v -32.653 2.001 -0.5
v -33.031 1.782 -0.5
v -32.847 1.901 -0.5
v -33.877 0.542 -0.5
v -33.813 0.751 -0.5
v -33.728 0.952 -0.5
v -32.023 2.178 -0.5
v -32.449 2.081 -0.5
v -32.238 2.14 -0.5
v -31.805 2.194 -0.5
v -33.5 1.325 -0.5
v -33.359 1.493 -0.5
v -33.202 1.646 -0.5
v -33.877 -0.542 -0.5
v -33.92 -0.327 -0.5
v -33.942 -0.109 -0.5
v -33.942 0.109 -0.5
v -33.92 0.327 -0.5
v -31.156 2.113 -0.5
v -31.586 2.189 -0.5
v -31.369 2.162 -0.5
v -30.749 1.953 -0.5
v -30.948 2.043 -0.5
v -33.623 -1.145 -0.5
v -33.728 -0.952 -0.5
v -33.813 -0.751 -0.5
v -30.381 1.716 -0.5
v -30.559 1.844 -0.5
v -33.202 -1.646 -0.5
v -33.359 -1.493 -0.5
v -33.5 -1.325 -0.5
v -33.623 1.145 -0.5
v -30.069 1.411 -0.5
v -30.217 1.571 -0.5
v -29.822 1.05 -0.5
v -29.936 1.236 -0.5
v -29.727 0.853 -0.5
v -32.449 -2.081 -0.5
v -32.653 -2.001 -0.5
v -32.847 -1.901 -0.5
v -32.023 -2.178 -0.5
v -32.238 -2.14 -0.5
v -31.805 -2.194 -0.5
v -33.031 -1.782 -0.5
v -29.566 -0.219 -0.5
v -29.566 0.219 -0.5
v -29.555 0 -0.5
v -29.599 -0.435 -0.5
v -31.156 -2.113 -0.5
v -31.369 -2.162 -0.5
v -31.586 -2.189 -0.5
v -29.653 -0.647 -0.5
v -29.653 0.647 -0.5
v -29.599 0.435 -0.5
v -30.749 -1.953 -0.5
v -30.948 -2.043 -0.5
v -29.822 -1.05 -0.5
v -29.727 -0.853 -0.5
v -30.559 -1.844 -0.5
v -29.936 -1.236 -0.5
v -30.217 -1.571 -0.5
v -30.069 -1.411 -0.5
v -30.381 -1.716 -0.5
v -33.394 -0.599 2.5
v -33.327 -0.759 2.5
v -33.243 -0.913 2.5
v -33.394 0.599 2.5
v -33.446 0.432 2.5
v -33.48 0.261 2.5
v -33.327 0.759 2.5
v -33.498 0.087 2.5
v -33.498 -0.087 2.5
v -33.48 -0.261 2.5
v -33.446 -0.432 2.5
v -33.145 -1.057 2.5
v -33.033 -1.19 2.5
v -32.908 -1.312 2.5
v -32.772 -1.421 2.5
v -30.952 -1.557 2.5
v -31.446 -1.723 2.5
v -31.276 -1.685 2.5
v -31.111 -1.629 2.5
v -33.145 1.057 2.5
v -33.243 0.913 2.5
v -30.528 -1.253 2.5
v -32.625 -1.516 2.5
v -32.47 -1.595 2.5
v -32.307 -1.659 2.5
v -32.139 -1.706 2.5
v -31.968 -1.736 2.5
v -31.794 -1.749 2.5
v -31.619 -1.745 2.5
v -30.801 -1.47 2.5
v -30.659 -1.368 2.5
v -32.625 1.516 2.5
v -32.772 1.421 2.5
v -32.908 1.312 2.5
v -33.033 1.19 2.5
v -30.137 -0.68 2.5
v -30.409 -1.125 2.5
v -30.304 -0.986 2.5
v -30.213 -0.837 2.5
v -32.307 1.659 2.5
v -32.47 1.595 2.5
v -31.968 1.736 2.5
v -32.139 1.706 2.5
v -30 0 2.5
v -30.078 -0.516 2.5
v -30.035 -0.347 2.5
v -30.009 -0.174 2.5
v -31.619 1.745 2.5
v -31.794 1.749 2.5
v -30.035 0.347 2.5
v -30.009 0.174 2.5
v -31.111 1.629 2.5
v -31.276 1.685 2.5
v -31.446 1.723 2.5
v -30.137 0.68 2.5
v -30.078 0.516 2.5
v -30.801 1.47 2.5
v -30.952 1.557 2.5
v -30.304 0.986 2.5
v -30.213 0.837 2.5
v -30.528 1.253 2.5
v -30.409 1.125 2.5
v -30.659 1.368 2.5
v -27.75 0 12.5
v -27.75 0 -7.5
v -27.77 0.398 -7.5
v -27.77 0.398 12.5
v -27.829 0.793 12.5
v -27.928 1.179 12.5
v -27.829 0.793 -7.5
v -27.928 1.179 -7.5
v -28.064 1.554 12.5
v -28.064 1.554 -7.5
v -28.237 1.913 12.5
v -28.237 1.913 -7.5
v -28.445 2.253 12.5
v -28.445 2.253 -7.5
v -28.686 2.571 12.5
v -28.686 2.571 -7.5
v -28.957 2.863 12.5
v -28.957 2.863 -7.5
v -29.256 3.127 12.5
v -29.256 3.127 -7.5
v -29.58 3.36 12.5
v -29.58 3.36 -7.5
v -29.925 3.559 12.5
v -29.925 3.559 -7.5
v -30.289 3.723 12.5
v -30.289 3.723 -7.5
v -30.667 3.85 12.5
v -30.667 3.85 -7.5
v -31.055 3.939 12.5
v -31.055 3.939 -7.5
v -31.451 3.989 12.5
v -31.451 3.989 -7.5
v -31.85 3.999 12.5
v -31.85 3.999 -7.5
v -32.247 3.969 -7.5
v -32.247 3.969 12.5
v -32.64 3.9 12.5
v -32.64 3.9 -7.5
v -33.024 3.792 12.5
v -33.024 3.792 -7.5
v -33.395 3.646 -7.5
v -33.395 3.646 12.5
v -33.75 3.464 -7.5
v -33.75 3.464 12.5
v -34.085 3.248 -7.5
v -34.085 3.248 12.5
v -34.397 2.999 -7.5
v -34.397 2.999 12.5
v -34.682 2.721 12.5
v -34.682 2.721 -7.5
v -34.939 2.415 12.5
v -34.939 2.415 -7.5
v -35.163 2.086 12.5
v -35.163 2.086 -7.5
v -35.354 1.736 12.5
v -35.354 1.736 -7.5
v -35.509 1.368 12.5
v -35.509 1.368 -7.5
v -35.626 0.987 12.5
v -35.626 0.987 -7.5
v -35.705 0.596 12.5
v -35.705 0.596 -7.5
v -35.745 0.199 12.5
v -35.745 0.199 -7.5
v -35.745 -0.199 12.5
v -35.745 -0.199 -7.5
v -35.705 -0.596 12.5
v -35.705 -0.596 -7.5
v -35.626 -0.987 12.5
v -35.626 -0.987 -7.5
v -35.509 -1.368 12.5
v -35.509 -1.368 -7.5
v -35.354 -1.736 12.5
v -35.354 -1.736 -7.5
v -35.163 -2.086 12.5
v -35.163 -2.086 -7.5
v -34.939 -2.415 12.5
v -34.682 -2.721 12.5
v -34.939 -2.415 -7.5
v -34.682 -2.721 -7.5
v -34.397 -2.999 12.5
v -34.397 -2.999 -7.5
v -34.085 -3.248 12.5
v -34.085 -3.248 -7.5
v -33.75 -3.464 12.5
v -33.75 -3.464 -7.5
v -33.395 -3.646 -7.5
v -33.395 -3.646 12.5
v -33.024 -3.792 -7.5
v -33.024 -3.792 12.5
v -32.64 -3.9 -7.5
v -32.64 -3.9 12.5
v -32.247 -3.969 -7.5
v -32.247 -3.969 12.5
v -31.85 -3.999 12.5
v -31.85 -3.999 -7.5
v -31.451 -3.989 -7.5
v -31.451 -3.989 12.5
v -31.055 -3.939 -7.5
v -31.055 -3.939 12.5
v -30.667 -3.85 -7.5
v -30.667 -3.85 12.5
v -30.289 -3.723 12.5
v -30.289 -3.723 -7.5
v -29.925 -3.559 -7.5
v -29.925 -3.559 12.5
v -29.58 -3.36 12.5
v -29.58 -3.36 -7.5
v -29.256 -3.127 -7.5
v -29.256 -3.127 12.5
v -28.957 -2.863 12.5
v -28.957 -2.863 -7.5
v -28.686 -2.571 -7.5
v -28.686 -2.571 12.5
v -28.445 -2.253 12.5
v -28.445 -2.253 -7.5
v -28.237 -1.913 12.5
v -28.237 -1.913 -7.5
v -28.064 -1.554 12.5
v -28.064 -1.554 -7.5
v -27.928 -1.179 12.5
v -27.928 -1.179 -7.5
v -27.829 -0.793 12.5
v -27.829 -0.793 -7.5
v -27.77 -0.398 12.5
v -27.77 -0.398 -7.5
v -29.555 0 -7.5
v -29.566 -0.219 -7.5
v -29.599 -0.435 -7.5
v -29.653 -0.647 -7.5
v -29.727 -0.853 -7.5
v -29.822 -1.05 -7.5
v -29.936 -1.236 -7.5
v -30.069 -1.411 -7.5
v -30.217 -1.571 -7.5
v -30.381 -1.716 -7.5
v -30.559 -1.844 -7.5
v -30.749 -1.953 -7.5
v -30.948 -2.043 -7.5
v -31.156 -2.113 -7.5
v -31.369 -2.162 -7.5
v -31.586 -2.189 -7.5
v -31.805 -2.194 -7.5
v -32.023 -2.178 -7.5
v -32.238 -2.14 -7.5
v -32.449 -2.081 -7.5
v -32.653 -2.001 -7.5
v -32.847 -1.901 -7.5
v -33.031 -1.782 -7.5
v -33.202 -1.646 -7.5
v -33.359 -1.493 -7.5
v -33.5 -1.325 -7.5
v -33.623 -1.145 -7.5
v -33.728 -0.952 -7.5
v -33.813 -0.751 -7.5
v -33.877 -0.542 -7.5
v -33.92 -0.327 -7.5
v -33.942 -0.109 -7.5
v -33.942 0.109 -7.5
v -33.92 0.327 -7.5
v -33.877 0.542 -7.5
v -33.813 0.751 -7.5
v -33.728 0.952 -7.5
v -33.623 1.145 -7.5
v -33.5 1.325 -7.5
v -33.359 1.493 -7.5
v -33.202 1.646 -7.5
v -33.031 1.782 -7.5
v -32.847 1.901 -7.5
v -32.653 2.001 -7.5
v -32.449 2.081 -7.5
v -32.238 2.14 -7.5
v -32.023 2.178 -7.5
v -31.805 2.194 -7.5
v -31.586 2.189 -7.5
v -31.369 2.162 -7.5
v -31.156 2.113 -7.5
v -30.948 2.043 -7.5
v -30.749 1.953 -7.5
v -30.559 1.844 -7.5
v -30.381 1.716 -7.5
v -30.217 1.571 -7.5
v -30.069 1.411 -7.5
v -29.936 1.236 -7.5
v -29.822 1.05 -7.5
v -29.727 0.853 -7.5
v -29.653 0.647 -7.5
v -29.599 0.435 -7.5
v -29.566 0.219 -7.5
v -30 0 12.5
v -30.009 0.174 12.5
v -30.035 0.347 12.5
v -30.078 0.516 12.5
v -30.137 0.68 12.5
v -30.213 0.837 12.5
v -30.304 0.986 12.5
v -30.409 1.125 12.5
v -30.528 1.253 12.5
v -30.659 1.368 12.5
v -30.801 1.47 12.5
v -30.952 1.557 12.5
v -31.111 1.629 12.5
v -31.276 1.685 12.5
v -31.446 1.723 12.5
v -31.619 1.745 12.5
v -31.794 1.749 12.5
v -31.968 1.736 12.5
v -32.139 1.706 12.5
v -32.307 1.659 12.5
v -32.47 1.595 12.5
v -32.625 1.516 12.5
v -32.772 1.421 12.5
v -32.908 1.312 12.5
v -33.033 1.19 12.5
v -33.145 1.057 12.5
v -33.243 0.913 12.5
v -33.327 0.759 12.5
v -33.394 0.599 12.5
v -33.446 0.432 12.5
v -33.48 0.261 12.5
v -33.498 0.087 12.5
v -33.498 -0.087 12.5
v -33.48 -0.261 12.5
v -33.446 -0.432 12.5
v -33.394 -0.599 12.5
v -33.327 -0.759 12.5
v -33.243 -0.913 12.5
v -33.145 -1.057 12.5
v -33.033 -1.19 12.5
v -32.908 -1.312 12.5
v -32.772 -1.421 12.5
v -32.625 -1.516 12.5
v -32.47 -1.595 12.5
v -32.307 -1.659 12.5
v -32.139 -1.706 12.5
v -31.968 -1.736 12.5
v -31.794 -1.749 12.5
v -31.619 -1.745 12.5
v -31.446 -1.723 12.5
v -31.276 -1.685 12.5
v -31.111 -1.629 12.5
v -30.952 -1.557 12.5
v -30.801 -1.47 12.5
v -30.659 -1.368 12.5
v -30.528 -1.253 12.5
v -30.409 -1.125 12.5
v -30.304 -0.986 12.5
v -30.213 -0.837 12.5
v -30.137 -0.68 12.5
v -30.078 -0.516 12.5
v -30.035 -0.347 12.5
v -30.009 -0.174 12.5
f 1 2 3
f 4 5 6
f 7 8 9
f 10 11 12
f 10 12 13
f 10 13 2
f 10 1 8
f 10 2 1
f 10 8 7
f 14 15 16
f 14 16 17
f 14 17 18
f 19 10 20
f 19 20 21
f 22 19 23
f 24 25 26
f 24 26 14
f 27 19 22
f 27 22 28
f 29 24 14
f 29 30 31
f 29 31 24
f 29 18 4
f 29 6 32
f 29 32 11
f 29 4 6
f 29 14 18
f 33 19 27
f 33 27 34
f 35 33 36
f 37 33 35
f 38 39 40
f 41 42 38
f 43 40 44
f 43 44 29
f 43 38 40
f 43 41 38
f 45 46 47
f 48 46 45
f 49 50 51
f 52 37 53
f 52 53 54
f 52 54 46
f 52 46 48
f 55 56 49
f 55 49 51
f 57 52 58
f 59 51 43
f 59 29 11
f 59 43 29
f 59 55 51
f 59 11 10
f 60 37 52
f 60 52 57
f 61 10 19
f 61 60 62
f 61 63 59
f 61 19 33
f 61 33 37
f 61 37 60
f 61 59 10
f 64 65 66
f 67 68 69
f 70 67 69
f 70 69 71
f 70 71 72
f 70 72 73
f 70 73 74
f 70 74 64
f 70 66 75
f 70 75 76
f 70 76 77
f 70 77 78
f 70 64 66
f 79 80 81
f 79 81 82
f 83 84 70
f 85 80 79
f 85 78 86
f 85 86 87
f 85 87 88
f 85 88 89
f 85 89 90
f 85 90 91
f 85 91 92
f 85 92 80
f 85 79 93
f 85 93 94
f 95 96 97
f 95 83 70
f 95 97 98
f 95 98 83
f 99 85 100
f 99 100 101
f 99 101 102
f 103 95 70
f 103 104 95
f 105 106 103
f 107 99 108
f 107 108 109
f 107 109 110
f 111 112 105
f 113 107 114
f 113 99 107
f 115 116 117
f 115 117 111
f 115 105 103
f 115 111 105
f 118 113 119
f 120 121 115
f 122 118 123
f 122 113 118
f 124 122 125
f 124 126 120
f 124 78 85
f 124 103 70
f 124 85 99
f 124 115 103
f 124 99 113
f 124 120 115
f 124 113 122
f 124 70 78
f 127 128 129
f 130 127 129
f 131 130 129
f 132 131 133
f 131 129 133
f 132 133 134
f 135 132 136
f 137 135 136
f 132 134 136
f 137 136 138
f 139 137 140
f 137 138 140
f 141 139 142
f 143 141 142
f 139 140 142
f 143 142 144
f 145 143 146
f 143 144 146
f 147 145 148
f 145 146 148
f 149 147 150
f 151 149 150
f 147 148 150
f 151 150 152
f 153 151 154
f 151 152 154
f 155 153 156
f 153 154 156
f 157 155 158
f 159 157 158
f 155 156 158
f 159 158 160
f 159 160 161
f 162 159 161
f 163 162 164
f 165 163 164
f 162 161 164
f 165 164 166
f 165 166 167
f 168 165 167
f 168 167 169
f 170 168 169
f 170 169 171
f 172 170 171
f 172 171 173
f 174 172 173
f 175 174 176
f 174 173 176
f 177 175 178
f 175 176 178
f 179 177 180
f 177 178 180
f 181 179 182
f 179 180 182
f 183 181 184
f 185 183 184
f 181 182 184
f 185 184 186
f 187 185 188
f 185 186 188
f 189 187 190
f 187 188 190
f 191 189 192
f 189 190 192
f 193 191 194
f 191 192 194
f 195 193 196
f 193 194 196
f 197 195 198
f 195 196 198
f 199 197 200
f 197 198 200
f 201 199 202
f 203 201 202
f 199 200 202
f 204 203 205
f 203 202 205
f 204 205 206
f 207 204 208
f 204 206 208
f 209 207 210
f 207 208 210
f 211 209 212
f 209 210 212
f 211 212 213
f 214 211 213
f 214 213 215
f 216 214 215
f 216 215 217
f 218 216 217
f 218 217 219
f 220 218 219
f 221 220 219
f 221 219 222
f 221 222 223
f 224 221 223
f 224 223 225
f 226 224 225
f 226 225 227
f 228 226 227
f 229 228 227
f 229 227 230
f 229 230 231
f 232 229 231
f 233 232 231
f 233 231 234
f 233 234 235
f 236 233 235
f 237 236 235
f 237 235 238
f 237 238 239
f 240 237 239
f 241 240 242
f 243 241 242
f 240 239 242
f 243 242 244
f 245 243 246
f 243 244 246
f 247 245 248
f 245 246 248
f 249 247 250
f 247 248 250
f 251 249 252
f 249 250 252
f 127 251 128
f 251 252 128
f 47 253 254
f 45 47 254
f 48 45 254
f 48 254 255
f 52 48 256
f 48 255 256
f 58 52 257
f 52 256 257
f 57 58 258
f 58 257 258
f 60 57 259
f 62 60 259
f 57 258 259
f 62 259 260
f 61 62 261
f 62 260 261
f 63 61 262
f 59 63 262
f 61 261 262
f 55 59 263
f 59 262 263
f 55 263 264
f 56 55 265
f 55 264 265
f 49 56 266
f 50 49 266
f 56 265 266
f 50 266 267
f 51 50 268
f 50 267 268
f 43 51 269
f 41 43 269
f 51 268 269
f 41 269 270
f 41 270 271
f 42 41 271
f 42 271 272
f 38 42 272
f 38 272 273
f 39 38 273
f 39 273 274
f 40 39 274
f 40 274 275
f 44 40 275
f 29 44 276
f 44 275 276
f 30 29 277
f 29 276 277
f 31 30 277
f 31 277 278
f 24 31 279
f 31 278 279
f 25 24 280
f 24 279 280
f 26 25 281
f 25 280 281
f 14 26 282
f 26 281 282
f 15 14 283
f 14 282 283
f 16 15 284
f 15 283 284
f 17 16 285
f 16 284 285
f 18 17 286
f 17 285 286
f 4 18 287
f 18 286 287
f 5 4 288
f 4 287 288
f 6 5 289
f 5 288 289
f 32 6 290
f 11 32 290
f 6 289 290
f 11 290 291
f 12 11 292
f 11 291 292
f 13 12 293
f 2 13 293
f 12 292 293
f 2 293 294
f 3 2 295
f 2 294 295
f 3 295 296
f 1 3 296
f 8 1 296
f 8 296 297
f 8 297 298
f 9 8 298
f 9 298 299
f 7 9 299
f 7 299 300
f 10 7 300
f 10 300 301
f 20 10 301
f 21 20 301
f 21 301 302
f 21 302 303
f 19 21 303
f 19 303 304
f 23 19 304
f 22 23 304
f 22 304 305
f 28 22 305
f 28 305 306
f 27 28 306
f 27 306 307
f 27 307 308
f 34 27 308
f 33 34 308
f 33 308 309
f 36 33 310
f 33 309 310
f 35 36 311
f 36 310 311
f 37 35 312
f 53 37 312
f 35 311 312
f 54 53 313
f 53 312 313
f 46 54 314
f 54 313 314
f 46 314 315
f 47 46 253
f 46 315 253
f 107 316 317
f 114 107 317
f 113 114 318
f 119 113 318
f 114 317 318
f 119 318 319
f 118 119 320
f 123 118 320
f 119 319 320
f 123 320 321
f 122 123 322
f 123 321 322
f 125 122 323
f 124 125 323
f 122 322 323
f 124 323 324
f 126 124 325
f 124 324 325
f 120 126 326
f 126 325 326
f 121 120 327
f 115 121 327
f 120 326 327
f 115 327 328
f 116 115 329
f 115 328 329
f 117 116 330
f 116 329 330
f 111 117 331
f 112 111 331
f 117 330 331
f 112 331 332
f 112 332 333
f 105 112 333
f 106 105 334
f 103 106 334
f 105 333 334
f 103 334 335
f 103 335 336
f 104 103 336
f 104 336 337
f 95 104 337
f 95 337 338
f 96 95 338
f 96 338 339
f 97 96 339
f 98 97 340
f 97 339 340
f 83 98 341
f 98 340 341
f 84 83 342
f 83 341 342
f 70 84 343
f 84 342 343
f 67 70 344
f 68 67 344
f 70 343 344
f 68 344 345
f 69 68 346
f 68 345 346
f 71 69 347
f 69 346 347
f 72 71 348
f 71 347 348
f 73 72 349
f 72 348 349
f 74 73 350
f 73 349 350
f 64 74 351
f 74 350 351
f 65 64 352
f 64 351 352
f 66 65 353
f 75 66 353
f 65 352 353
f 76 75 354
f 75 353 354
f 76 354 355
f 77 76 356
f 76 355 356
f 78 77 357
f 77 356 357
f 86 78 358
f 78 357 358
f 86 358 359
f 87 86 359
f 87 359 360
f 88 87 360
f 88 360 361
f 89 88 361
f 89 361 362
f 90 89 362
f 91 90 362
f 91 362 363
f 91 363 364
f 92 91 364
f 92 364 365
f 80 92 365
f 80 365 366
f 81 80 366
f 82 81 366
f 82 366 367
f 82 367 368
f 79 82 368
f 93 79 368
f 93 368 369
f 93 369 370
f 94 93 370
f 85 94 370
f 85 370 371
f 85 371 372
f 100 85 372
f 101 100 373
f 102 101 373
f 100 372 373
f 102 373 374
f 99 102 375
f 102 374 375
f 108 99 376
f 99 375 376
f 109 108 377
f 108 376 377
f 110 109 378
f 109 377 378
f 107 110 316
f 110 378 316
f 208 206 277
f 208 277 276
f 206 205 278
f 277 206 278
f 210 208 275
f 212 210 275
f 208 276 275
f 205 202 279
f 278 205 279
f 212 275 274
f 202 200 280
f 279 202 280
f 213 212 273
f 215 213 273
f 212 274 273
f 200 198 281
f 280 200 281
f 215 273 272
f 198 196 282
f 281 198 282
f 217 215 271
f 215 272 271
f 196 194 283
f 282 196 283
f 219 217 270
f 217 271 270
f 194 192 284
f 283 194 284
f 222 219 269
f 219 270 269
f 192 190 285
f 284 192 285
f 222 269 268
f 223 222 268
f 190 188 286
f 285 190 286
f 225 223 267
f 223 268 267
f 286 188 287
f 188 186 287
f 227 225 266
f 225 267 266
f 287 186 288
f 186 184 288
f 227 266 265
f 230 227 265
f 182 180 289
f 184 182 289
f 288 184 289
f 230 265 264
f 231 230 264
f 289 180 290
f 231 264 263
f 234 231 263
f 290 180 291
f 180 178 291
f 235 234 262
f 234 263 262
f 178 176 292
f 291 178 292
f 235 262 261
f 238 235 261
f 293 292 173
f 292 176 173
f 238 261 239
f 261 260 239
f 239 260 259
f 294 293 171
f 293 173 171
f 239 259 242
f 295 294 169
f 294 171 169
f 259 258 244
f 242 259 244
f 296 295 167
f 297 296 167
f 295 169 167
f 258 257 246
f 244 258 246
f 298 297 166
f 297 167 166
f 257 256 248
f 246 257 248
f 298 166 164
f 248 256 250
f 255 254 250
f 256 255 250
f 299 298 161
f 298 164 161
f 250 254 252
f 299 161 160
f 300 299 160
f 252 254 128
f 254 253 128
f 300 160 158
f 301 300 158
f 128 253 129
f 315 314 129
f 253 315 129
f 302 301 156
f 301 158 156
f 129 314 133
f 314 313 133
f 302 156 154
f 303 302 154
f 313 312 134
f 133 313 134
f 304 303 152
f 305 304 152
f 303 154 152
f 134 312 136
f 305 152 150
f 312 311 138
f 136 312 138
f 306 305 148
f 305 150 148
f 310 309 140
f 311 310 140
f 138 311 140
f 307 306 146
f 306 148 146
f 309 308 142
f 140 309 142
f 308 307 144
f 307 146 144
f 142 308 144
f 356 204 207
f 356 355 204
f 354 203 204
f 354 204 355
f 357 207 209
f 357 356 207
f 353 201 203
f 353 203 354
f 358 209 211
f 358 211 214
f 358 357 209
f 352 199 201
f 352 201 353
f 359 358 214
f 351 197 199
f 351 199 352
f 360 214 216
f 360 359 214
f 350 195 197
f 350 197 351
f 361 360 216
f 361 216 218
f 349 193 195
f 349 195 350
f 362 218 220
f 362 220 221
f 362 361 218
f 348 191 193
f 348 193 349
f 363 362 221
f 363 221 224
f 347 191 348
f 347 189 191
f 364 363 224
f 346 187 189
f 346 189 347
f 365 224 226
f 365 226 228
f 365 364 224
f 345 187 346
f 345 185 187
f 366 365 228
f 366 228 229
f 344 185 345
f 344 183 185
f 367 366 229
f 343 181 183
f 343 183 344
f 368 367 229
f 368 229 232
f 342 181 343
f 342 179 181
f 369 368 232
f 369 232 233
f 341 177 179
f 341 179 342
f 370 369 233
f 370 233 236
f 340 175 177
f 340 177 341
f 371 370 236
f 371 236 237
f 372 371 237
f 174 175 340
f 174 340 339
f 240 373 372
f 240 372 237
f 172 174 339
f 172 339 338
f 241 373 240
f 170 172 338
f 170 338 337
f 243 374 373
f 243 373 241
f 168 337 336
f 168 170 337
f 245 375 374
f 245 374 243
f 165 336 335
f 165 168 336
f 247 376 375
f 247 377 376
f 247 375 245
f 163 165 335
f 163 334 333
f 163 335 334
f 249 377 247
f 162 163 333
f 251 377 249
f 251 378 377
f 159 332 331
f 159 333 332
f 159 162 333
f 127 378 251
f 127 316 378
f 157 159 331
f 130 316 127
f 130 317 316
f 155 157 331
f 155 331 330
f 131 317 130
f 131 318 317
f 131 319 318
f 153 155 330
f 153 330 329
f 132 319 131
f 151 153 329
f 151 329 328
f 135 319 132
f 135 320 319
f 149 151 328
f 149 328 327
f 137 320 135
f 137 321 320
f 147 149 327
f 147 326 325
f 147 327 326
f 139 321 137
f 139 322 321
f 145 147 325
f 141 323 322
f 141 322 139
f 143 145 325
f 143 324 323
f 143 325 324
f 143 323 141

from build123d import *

# Parameters (mm, degrees)
SKETCH022_R     = 4
PAD009_DEPTH    = 20
SKETCH023_R     = 2.19496
POCKET011_DEPTH = 7
SKETCH025_R     = 1.75
POCKET012_DEPTH = 10


with BuildPart() as part:
    # Sketch022 → Pad009 (new body)
    with BuildSketch(Plane.XY):
        Circle(SKETCH022_R)
    extrude(amount=PAD009_DEPTH)

    # Sketch023 (on Face2 of Pad009) → Pocket011 (cut)
    with BuildSketch(Plane(origin=(0, 0, 0), x_dir=(1, 0, 0), z_dir=(0, 0, -1))):
        Circle(SKETCH023_R)
    extrude(amount=-POCKET011_DEPTH, mode=Mode.SUBTRACT)

    # Sketch025 (on Face3 of Pocket011) → Pocket012 (cut)
    with BuildSketch(Plane.XY.offset(20)):
        Circle(SKETCH025_R)
    extrude(amount=-POCKET012_DEPTH, mode=Mode.SUBTRACT)


with BuildPart() as part_1:
    # Body006 placement: moved
    add(part.part.moved(Location((-31.75, 0, -7.5))))


solid = part_1.part
